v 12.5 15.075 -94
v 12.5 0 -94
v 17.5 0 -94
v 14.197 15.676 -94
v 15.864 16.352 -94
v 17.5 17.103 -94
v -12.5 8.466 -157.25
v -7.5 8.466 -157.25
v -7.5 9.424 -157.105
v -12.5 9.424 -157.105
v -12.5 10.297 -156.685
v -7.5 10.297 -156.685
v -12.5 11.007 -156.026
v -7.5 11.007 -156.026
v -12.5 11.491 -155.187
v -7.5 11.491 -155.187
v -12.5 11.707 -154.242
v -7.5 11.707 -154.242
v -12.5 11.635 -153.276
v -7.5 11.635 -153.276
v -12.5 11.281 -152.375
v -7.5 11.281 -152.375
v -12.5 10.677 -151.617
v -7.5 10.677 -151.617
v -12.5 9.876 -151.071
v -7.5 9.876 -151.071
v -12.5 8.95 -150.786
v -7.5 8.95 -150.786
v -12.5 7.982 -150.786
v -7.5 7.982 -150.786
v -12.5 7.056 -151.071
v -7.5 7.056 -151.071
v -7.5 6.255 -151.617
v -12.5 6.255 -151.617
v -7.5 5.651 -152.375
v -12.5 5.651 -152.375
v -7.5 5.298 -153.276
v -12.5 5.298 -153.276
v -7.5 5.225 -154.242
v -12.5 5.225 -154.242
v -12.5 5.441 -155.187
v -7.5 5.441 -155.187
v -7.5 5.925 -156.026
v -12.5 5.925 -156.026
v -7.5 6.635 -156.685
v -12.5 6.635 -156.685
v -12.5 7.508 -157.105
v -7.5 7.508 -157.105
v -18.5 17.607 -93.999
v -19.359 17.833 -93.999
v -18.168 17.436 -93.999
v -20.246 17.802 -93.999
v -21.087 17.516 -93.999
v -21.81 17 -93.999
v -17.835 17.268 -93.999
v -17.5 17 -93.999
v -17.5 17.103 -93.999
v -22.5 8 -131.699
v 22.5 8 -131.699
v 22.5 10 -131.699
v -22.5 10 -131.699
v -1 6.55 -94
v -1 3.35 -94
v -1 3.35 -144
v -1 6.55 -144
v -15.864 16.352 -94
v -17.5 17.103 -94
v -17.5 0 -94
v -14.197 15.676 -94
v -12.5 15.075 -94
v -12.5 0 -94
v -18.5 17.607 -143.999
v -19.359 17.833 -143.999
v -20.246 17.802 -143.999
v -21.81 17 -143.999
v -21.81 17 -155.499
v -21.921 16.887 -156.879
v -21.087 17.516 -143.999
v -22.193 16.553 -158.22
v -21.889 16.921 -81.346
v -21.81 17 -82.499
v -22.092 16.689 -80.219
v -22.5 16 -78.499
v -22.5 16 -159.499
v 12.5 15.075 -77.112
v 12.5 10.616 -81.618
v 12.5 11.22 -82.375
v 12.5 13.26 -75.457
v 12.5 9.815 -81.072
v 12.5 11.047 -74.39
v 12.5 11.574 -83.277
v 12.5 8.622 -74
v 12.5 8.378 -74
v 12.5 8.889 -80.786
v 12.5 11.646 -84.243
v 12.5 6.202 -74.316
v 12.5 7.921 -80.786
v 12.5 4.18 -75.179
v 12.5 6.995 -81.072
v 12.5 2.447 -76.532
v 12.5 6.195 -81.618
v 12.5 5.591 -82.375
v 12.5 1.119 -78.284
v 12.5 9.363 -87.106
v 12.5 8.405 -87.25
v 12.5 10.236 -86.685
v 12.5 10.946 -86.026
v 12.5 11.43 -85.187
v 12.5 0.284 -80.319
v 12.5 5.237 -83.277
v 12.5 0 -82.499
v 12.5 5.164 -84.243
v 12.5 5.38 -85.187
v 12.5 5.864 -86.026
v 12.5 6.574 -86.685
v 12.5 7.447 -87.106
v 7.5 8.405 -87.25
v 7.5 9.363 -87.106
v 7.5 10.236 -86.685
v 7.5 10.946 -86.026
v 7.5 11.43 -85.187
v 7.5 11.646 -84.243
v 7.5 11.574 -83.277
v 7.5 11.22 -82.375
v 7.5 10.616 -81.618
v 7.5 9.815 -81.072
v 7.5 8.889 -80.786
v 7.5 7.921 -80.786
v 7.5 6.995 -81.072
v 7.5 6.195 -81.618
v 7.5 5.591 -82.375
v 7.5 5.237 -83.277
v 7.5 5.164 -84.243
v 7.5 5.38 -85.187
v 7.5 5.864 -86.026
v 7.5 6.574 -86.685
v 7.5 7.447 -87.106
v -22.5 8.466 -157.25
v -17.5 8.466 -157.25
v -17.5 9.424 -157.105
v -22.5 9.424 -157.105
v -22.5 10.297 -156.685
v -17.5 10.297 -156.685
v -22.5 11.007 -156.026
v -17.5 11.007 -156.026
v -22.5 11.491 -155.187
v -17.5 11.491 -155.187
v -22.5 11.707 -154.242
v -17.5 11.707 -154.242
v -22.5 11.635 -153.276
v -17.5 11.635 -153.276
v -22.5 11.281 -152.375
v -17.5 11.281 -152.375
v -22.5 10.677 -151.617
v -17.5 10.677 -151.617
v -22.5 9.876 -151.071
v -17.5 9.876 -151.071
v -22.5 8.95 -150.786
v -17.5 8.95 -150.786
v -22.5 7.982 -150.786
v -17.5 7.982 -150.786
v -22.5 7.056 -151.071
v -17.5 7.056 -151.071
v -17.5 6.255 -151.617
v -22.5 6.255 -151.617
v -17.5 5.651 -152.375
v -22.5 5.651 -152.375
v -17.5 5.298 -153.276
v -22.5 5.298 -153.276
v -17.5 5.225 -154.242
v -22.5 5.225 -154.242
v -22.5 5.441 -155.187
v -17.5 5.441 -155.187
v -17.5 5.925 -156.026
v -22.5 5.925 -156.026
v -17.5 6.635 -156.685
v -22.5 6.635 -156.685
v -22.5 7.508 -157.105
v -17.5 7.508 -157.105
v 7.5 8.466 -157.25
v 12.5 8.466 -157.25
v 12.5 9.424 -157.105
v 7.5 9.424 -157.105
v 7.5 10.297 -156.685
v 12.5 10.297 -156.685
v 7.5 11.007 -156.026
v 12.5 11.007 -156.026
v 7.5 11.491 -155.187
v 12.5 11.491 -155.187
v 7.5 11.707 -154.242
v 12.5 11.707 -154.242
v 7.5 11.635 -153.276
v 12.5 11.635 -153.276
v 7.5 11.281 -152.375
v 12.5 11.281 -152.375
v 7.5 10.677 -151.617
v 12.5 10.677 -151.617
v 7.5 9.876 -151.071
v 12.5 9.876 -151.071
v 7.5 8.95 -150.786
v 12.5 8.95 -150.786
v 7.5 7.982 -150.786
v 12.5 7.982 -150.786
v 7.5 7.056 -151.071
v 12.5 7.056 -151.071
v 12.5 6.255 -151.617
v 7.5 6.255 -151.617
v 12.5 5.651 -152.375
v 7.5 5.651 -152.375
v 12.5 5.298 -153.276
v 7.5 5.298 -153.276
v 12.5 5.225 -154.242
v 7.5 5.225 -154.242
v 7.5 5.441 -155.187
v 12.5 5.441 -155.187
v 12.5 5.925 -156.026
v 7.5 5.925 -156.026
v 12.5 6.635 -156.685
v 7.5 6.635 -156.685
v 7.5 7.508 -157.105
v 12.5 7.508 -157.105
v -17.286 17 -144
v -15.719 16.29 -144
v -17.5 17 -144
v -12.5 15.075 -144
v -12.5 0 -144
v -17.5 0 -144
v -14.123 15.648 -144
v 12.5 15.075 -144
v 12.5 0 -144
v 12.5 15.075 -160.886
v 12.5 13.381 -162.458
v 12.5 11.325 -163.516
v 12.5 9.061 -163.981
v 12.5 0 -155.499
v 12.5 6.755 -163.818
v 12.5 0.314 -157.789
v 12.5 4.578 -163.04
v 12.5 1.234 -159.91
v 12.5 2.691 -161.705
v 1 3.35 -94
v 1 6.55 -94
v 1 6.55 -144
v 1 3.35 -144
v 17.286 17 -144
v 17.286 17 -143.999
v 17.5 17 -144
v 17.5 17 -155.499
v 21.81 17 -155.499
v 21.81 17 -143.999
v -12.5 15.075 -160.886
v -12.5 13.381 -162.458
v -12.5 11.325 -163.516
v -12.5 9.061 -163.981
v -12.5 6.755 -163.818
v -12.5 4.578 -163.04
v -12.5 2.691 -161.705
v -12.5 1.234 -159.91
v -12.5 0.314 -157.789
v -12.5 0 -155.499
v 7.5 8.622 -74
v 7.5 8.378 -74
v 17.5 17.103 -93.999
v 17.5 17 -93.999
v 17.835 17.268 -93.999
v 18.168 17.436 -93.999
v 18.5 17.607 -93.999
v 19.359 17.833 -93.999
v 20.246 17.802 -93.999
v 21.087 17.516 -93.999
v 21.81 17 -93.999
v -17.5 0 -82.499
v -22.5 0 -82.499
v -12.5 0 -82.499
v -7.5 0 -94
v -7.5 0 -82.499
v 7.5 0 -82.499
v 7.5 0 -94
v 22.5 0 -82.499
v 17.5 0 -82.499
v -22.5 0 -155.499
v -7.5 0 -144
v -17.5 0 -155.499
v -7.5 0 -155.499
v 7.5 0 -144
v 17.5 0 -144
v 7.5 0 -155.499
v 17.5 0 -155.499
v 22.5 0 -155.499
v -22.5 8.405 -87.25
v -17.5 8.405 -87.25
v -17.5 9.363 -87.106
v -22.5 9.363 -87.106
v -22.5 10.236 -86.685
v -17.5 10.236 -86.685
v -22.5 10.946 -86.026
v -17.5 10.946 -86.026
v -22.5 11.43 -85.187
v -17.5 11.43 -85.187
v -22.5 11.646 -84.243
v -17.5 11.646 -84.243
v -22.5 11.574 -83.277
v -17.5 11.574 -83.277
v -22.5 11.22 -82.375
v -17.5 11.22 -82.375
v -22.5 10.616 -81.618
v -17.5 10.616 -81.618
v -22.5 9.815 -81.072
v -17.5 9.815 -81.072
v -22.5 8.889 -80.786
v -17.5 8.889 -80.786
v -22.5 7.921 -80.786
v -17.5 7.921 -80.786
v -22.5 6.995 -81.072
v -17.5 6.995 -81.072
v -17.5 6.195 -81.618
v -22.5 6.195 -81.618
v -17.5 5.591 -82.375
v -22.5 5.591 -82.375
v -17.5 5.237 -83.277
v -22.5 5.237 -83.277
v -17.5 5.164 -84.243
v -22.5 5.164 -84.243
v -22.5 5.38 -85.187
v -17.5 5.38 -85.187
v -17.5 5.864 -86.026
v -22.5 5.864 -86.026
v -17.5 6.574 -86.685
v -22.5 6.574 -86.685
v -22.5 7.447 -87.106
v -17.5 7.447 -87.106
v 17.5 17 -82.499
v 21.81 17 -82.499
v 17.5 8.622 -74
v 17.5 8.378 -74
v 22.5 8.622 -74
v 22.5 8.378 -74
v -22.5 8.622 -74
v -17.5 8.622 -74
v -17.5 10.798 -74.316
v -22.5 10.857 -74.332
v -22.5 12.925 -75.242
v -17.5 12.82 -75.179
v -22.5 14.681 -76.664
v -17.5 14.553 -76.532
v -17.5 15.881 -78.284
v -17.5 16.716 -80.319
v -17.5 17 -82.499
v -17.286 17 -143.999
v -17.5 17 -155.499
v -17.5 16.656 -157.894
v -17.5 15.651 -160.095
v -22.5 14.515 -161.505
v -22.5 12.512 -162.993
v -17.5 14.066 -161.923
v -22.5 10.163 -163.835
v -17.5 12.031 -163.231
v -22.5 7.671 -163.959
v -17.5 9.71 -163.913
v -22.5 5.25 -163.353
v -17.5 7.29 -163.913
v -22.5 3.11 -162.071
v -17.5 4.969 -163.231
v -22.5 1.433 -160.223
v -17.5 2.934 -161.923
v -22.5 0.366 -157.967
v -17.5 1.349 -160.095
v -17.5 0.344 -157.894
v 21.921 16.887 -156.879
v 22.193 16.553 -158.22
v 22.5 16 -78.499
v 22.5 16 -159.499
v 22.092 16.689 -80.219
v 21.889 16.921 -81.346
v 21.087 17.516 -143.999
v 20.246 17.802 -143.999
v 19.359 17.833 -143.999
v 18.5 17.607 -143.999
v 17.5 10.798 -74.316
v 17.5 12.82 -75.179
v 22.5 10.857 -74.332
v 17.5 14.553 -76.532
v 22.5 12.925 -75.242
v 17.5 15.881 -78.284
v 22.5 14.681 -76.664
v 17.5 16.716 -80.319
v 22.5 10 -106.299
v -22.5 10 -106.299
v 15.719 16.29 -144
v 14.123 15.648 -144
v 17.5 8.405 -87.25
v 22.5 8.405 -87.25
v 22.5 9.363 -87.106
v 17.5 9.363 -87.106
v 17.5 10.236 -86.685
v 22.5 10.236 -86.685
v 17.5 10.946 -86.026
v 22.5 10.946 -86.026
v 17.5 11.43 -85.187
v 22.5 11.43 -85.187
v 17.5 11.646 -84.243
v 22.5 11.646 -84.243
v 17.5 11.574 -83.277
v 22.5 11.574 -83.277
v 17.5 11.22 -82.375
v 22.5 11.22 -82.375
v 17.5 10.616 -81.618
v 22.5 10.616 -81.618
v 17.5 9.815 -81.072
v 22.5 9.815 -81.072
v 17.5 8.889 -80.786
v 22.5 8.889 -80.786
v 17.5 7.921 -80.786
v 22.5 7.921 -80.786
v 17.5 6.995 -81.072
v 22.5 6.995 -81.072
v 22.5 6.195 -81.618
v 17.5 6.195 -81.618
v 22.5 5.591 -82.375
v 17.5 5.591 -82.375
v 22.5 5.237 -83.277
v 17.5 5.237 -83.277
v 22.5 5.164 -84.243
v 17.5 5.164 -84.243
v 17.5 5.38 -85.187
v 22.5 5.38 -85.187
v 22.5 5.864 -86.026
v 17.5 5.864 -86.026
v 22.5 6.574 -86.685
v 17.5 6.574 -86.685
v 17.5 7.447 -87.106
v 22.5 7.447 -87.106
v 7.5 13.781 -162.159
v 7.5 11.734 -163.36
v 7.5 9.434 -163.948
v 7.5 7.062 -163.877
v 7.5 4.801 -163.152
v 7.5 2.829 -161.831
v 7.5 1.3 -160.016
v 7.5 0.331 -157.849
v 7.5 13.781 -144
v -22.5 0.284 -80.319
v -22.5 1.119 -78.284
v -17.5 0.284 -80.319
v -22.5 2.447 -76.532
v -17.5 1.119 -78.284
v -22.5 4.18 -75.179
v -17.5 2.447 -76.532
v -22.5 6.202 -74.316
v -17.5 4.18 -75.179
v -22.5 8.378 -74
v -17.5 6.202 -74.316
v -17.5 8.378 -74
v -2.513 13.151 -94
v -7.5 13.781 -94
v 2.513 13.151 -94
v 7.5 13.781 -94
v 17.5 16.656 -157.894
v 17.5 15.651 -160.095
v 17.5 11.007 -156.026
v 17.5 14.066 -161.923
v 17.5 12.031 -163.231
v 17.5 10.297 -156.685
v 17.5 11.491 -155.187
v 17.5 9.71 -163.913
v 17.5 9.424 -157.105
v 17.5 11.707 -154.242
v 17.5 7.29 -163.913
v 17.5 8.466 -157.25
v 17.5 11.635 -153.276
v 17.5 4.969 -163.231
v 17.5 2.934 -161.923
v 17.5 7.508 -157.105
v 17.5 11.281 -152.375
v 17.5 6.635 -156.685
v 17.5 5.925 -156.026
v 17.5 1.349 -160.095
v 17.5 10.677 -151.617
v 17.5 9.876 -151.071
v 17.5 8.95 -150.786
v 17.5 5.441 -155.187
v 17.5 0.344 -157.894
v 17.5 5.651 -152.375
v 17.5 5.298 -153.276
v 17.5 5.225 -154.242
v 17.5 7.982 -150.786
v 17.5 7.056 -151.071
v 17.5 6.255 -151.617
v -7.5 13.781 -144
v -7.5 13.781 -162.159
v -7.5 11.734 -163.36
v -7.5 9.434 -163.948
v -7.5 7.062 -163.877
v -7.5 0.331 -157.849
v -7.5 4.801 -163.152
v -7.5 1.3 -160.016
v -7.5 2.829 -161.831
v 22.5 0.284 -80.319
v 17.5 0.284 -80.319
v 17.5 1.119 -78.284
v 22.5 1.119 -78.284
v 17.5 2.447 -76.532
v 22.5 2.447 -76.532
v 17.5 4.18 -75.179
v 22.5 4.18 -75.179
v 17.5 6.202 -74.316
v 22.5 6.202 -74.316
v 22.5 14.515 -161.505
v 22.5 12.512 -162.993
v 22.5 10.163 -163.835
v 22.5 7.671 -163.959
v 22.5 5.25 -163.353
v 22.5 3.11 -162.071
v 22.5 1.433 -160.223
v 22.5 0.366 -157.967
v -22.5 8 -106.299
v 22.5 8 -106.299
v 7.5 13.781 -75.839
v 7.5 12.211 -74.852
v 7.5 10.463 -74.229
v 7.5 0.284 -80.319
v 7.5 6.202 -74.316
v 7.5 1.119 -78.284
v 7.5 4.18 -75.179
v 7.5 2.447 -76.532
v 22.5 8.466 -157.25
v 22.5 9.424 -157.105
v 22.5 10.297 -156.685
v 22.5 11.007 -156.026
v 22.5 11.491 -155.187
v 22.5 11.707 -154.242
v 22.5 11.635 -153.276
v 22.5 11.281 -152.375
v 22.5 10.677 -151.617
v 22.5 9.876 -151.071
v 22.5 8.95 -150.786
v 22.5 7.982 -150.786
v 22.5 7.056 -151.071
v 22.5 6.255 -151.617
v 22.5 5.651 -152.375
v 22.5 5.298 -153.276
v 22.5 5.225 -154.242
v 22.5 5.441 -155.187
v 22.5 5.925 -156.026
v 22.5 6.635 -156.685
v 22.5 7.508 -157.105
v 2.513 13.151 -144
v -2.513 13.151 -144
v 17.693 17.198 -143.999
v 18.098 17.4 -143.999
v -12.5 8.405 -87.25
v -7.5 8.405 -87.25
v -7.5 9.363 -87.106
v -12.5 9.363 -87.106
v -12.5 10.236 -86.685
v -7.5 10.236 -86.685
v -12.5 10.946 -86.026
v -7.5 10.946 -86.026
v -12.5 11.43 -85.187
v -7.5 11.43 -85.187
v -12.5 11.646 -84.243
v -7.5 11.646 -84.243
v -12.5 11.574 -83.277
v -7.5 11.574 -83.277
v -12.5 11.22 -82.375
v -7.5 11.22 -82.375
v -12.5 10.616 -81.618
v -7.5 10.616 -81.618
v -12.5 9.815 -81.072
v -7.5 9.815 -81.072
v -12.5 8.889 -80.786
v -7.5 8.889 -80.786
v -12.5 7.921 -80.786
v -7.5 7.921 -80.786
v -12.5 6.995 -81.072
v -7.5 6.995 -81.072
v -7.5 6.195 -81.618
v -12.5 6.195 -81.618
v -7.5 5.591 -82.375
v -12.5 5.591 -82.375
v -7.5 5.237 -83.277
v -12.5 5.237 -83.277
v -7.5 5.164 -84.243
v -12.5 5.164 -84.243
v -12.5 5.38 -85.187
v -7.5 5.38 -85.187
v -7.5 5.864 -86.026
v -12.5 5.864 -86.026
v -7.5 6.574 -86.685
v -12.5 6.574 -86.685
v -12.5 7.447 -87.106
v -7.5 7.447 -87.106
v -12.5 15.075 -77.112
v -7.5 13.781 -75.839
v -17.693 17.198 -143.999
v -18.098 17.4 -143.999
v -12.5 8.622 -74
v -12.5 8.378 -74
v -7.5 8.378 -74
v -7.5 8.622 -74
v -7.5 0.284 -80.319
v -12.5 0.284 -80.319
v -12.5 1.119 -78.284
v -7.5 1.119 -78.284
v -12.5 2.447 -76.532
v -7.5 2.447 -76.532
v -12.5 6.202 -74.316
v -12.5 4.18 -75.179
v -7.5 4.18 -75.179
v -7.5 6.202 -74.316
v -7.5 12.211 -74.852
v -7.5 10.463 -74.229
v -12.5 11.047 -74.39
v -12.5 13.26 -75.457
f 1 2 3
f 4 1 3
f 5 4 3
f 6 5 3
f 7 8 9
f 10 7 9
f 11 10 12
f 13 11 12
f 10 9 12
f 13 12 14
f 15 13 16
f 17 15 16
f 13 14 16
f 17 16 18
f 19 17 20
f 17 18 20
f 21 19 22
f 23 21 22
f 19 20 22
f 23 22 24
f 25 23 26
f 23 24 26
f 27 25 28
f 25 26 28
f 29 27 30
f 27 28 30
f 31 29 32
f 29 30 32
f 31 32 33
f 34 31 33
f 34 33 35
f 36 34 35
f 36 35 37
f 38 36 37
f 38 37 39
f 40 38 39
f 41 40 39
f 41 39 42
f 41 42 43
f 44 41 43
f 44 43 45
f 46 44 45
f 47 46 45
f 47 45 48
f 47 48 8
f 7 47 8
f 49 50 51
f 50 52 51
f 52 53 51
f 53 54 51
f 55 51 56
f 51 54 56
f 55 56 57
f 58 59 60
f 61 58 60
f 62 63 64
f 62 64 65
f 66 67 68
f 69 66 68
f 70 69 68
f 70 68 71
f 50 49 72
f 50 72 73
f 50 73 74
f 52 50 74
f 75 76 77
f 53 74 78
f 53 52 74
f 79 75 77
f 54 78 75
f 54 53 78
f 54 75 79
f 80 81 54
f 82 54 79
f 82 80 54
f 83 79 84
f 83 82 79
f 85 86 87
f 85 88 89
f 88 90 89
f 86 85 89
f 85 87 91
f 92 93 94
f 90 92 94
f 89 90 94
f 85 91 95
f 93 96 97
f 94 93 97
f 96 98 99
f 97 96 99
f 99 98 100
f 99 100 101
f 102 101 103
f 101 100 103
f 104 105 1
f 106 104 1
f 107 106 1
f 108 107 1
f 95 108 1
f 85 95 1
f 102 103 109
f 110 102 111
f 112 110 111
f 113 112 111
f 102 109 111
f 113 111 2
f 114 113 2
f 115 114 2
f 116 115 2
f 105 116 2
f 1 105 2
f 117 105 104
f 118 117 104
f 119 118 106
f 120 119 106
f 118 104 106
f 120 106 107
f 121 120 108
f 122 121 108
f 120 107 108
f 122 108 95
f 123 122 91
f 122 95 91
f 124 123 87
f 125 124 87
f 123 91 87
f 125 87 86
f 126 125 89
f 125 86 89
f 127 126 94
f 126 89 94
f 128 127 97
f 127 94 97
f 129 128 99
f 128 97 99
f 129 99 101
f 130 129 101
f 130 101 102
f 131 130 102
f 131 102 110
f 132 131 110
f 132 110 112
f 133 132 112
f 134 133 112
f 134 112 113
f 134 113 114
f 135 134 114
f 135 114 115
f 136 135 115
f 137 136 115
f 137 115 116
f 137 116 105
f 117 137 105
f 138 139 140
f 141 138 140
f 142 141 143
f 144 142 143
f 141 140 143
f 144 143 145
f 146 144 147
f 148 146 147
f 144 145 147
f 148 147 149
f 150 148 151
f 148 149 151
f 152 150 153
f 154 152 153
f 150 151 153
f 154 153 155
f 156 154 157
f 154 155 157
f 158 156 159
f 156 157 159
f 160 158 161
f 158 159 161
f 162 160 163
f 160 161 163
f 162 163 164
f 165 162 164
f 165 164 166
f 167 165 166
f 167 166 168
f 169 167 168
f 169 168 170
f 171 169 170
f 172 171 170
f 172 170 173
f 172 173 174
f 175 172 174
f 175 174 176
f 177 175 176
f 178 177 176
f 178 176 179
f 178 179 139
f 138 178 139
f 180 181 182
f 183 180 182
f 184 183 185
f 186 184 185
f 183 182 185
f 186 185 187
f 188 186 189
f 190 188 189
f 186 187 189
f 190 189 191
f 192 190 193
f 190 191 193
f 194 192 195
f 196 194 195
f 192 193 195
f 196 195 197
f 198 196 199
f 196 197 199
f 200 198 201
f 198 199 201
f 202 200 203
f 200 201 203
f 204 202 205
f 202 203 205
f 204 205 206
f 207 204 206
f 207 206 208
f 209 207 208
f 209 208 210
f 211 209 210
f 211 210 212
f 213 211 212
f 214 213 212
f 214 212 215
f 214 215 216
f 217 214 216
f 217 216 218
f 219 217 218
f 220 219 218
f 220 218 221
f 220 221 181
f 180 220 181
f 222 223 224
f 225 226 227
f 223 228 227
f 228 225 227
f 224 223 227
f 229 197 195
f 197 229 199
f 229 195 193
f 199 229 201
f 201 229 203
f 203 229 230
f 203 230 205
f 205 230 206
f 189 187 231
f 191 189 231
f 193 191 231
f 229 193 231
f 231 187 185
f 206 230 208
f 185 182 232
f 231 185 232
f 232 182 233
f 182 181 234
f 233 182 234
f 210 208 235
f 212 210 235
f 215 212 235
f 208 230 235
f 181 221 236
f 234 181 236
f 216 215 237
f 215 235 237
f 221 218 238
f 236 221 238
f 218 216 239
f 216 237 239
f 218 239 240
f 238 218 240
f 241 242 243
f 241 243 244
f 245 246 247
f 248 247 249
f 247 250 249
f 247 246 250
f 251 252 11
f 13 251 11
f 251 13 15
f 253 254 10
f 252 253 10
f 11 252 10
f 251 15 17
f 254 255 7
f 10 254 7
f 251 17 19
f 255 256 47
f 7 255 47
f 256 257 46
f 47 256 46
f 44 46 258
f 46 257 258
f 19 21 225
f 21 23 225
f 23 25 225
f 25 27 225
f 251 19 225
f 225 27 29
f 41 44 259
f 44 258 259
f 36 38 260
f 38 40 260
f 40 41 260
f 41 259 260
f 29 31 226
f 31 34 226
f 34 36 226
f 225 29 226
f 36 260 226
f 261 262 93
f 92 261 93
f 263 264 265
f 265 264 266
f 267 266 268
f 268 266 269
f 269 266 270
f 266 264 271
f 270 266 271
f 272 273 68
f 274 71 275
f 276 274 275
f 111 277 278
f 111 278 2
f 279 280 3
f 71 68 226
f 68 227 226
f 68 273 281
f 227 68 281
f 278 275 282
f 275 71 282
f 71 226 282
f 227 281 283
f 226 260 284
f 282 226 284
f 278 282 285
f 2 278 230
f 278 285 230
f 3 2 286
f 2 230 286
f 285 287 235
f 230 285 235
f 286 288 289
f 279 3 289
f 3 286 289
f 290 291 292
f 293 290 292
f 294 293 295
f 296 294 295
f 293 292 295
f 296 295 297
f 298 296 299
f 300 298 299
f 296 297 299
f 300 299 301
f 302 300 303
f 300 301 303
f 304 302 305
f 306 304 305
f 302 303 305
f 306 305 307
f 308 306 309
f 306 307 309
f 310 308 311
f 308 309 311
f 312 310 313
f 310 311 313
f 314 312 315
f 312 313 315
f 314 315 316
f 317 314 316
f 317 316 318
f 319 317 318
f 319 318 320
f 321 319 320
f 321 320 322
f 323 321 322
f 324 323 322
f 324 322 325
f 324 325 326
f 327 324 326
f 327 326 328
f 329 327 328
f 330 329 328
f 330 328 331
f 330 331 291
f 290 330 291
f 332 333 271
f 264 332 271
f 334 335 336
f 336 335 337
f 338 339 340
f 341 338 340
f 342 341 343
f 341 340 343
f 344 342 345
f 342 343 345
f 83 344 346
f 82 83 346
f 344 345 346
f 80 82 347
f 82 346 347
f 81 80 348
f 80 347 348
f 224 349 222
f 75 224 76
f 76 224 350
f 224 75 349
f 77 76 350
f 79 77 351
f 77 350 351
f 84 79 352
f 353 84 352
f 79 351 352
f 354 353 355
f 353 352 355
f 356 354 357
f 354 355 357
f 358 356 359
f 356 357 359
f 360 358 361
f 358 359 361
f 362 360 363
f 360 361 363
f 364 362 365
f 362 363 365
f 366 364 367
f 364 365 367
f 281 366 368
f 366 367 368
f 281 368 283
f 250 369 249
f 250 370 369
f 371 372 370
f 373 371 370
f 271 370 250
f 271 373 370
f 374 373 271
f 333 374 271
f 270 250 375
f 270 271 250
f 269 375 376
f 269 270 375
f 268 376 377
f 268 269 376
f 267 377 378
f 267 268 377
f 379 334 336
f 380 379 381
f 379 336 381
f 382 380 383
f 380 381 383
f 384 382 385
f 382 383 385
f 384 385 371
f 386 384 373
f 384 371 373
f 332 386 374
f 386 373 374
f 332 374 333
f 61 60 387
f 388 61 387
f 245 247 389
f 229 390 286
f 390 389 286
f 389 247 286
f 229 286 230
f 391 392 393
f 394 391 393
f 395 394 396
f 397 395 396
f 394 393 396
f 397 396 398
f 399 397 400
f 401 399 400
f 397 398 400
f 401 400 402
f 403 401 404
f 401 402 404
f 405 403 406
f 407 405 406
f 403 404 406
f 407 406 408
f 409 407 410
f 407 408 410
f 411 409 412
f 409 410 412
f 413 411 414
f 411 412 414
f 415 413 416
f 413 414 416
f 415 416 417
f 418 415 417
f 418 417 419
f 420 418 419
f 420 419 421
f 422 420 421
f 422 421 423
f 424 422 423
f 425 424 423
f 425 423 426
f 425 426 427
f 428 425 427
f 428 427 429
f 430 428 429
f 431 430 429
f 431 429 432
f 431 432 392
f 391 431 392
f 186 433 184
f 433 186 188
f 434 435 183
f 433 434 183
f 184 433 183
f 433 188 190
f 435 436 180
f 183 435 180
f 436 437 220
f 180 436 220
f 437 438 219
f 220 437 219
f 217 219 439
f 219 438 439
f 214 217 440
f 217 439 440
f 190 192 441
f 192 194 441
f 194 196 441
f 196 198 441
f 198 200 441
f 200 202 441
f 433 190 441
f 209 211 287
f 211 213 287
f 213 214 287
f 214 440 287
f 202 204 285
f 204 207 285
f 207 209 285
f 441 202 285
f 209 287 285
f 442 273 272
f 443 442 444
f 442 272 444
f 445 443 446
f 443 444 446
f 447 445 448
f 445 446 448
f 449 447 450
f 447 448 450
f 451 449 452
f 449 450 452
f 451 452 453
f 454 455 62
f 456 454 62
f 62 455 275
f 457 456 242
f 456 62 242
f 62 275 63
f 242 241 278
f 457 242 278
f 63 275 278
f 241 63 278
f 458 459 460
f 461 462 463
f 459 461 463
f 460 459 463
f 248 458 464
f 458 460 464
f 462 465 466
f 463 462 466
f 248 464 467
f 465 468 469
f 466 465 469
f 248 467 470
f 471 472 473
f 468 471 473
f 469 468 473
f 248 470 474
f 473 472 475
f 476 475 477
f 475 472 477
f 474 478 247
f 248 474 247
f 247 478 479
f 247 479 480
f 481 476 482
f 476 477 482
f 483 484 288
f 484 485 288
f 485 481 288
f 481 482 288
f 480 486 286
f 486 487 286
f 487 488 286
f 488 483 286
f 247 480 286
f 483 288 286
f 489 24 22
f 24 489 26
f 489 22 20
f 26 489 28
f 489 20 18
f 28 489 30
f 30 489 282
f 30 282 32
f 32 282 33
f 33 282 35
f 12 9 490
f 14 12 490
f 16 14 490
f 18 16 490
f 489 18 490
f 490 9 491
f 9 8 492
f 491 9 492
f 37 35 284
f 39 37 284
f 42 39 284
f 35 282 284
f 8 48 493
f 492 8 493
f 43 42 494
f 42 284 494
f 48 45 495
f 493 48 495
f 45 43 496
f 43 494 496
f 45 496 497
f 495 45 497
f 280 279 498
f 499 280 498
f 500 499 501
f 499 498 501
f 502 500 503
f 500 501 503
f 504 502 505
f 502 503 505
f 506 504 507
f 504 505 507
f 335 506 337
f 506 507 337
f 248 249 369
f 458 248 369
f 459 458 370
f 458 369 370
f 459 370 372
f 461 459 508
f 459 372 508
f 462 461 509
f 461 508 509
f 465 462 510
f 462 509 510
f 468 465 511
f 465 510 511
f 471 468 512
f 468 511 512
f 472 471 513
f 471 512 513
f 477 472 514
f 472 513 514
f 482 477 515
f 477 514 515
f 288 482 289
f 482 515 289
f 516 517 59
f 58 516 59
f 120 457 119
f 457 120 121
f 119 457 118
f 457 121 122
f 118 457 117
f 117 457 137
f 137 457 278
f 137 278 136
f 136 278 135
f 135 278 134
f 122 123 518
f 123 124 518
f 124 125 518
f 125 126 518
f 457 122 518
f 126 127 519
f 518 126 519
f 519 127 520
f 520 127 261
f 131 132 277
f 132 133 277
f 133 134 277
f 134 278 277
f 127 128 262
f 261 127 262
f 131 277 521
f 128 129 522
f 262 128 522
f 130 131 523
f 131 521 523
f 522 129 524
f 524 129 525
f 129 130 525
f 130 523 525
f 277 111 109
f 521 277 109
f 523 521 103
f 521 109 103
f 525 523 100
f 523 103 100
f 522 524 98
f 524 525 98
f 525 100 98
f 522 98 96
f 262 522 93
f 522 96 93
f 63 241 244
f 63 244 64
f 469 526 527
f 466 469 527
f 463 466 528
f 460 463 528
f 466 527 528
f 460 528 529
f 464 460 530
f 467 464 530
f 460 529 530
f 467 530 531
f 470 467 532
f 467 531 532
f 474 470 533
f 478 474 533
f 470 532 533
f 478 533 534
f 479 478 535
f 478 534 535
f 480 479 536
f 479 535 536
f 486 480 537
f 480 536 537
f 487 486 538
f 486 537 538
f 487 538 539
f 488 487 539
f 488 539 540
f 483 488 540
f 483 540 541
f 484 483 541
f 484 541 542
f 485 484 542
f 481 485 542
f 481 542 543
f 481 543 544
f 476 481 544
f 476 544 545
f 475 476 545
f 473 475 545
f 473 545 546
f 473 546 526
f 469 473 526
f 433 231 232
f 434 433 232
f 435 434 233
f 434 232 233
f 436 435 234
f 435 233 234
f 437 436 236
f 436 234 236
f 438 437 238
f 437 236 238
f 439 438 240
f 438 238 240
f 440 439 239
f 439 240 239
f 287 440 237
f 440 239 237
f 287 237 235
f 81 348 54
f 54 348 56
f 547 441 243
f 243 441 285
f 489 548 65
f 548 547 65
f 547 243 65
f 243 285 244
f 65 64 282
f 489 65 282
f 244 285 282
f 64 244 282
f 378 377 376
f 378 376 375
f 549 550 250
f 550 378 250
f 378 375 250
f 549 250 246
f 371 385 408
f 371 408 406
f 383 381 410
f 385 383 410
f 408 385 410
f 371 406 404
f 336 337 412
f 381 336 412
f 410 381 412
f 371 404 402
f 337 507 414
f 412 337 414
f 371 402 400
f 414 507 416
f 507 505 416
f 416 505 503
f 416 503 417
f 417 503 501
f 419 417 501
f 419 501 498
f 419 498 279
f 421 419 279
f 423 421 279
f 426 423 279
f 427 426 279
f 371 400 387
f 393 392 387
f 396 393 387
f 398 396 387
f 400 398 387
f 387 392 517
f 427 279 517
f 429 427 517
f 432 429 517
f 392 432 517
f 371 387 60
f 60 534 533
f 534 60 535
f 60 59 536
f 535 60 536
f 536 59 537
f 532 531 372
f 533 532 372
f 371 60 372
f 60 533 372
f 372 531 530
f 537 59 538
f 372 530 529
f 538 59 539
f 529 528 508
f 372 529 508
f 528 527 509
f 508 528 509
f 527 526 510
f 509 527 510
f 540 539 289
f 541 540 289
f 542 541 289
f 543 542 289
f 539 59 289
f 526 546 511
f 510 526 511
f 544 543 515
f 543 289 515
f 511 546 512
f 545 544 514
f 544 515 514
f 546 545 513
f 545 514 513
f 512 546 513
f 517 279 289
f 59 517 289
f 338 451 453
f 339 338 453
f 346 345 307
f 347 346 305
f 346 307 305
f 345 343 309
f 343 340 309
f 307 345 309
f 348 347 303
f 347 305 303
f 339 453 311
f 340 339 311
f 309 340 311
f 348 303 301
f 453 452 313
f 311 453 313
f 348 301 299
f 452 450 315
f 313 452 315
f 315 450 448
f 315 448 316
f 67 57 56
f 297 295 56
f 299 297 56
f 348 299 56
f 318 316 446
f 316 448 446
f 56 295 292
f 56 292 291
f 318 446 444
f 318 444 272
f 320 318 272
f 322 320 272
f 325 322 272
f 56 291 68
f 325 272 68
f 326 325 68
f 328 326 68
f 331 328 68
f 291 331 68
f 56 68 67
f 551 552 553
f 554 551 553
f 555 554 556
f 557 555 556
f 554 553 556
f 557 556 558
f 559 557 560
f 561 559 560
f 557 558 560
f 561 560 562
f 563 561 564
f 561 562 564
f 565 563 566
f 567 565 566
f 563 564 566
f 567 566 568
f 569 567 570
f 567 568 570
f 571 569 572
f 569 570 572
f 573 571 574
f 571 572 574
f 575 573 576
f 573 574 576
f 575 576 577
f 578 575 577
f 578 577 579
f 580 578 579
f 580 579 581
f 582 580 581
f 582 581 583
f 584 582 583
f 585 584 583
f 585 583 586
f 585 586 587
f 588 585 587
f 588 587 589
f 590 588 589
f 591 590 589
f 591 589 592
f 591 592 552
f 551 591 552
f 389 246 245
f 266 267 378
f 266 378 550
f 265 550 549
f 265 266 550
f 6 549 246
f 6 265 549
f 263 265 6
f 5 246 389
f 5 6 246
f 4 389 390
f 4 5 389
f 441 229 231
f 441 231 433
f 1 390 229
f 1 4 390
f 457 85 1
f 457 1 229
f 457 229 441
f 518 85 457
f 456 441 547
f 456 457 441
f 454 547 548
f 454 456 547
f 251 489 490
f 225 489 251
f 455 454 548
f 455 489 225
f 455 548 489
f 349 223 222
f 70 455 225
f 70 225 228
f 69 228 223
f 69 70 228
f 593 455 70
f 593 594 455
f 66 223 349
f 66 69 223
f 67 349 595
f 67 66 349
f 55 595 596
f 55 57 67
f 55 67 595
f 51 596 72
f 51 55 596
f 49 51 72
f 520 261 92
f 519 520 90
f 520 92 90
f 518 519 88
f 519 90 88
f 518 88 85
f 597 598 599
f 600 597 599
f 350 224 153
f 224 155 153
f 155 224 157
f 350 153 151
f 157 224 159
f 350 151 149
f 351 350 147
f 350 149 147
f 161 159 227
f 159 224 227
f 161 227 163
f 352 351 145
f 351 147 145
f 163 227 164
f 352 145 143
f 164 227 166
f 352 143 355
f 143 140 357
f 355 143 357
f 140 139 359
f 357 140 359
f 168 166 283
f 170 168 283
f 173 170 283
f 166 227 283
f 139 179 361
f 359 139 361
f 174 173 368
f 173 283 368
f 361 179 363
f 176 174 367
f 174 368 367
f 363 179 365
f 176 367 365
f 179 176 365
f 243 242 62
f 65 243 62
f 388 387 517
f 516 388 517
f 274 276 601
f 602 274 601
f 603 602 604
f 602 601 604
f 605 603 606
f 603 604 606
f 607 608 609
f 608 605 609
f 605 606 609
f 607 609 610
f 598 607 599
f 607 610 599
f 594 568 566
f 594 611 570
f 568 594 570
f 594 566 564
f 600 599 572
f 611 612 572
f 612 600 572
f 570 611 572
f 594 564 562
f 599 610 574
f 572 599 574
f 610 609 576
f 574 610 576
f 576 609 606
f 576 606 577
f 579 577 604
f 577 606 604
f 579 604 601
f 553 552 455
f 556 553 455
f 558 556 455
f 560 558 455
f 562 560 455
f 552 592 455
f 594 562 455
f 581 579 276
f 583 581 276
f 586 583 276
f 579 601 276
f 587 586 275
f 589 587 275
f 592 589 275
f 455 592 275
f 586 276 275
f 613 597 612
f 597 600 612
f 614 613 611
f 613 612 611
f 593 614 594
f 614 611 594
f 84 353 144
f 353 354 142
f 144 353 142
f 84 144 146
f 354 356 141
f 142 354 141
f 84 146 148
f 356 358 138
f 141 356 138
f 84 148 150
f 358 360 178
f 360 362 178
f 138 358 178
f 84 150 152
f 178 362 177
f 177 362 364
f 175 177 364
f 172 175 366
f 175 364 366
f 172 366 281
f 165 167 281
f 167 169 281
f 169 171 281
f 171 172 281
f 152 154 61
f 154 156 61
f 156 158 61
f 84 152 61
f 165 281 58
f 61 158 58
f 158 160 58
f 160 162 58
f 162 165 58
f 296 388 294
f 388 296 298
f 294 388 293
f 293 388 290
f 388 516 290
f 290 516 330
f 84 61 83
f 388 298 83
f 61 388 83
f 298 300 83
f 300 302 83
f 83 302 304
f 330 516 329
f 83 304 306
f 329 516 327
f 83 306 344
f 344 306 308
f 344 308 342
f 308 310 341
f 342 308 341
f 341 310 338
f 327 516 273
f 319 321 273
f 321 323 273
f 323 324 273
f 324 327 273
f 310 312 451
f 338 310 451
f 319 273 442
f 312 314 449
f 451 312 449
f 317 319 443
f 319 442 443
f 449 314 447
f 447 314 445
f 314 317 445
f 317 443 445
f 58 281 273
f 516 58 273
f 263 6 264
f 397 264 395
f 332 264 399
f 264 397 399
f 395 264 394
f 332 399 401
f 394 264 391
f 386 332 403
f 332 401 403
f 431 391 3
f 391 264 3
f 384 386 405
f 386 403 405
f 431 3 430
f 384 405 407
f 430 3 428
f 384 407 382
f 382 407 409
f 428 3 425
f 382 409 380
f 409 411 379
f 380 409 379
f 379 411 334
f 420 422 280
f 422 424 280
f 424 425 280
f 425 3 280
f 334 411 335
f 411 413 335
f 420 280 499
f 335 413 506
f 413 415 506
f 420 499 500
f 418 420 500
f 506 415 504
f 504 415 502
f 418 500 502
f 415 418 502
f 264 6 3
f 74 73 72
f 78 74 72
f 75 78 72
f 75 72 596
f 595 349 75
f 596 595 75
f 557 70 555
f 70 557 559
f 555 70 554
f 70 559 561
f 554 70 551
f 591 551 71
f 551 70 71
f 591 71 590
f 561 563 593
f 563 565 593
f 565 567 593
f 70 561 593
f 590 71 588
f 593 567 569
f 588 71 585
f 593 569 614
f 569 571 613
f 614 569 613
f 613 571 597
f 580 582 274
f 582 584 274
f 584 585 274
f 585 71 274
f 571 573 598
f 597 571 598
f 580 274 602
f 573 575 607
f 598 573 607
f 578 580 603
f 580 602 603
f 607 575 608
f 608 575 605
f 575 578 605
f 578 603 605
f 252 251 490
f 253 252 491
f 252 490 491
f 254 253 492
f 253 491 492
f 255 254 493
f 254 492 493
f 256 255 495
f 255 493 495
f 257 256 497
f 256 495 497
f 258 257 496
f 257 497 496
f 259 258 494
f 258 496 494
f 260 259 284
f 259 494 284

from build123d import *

# Parameters (mm, degrees)
BOSS_EXTRUDE1_DEPTH = 20
CUT_EXTRUDE21_DEPTH = 45
CUT_EXTRUDE23_DEPTH = 444
SKETCH9_R           = 3.25
SKETCH9_R_2         = 3.15
CUT_EXTRUDE24_DEPTH = 45
CUT_EXTRUDE26_DEPTH = 444
CUT_EXTRUDE27_DEPTH = 45


with BuildPart() as part:
    # Sketch1 → Boss-Extrude1 (new body)
    with BuildSketch(Plane(origin=(0, 0, 0), x_dir=(1, 0, 0), z_dir=(0, 1, 0))):
        Polygon((-22.5, 144), (-22.5, 94), (-22.5, 74), (-17.5, 74), (-17.5, 94), (-12.5, 94), (-12.5, 74), (-7.5, 74), (-7.5, 94), (-2.5, 94), (2.5, 94), (7.5, 94), (7.5, 74), (12.5, 74), (12.5, 94), (17.5, 94), (17.5, 74), (22.5, 74), (22.5, 94), (22.5, 144), (22.5, 164), (17.5, 164), (17.5, 144), (12.5, 144), (12.5, 164), (7.5, 164), (7.5, 144), (2.5, 144), (-2.5, 144), (-7.5, 144), (-7.5, 164), (-12.5, 164), (-12.5, 144), (-17.5, 144), (-17.5, 164), (-22.5, 164), align=None)
    extrude(amount=BOSS_EXTRUDE1_DEPTH)

    # Sketch7 → Cut-Extrude21 (cut)
    with BuildSketch(Plane(origin=(22.5, 0, 0), x_dir=(0, 0, -1), z_dir=(1, 0, 0))):
        with BuildLine():
            ThreePointArc((73.999126156, 8.5), (76.488718516, 14.51040764), (82.499126156, 17))
            Line((82.499126156, 17), (93.999126156, 17))
            Line((93.999126156, 17), (93.999126156, 20))
            Line((93.999126156, 20), (82.499126156, 20))
            Line((82.499126156, 20), (73.999126156, 20))
            Line((73.999126156, 20), (73.999126156, 17))
            Line((73.999126156, 17), (73.999126156, 8.5))
        make_face()
        with BuildLine():
            ThreePointArc((82.499126156, 0), (76.488718516, 2.48959236), (73.999126156, 8.5))
            Line((73.999126156, 8.5), (73.999126156, 0))
            Line((73.999126156, 0), (82.499126156, 0))
        make_face()
        with BuildLine():
            Line((155.499126156, 20), (143.999126156, 20))
            Line((143.999126156, 20), (143.999126156, 17))
            Line((143.999126156, 17), (155.499126156, 17))
            ThreePointArc((155.499126156, 17), (163.999126156, 8.5), (155.499126156, 0))
            Line((155.499126156, 0), (163.999126156, 0))
            Line((163.999126156, 0), (164, 0))
            Line((164, 0), (164, 20))
            Line((164, 20), (163.999126156, 20))
            Line((163.999126156, 20), (155.499126156, 20))
        make_face()
    extrude(amount=-CUT_EXTRUDE21_DEPTH, mode=Mode.SUBTRACT)

    # Sketch2 → Cut-Extrude23 (cut)
    with BuildSketch(Plane.XY.offset(50)):
        with BuildLine():
            Line((-22.5, 20), (22.5, 20))
            Line((22.5, 20), (22.5, 16))
            ThreePointArc((22.5, 16), (20.832845478, 17.631987193), (18.5, 17.607120136))
            ThreePointArc((18.5, 17.607120136), (0, 13.071891388), (-18.5, 17.607120136))
            ThreePointArc((-18.5, 17.607120136), (-20.832845478, 17.631987193), (-22.5, 16))
            Line((-22.5, 16), (-22.5, 20))
        make_face()
    extrude(amount=-CUT_EXTRUDE23_DEPTH, mode=Mode.SUBTRACT)

    # Sketch9 → Cut-Extrude24 (cut)
    with BuildSketch(Plane(origin=(22.5, 0, 0), x_dir=(0, 0, -1), z_dir=(1, 0, 0))):
        with Locations((153.999563078, 8.466039352)):
            Circle(SKETCH9_R)
        with Locations((84, 8.405099657)):
            Circle(SKETCH9_R)
        with Locations((178, 8.5)):
            Circle(SKETCH9_R_2)
        with Locations((60, 8.5)):
            Circle(SKETCH9_R_2)
    extrude(amount=-CUT_EXTRUDE24_DEPTH, mode=Mode.SUBTRACT)

    # Sketch12 → Cut-Extrude26 (cut)
    with BuildSketch(Plane.XY.offset(50)):
        Polygon((-1, 3.35), (-1, 6.55), (0, 6.55), (1, 6.55), (1, 3.35), align=None)
    extrude(amount=-CUT_EXTRUDE26_DEPTH, mode=Mode.SUBTRACT)

    # Sketch13 → Cut-Extrude27 (cut)
    with BuildSketch(Plane(origin=(22.5, 0, 0), x_dir=(0, 0, -1), z_dir=(1, 0, 0))):
        Polygon((118.999126156, 8), (131.699126156, 8), (131.699126156, 10), (106.299126156, 10), (106.299126156, 8), align=None)
    extrude(amount=-CUT_EXTRUDE27_DEPTH, mode=Mode.SUBTRACT)


solid = part.part
